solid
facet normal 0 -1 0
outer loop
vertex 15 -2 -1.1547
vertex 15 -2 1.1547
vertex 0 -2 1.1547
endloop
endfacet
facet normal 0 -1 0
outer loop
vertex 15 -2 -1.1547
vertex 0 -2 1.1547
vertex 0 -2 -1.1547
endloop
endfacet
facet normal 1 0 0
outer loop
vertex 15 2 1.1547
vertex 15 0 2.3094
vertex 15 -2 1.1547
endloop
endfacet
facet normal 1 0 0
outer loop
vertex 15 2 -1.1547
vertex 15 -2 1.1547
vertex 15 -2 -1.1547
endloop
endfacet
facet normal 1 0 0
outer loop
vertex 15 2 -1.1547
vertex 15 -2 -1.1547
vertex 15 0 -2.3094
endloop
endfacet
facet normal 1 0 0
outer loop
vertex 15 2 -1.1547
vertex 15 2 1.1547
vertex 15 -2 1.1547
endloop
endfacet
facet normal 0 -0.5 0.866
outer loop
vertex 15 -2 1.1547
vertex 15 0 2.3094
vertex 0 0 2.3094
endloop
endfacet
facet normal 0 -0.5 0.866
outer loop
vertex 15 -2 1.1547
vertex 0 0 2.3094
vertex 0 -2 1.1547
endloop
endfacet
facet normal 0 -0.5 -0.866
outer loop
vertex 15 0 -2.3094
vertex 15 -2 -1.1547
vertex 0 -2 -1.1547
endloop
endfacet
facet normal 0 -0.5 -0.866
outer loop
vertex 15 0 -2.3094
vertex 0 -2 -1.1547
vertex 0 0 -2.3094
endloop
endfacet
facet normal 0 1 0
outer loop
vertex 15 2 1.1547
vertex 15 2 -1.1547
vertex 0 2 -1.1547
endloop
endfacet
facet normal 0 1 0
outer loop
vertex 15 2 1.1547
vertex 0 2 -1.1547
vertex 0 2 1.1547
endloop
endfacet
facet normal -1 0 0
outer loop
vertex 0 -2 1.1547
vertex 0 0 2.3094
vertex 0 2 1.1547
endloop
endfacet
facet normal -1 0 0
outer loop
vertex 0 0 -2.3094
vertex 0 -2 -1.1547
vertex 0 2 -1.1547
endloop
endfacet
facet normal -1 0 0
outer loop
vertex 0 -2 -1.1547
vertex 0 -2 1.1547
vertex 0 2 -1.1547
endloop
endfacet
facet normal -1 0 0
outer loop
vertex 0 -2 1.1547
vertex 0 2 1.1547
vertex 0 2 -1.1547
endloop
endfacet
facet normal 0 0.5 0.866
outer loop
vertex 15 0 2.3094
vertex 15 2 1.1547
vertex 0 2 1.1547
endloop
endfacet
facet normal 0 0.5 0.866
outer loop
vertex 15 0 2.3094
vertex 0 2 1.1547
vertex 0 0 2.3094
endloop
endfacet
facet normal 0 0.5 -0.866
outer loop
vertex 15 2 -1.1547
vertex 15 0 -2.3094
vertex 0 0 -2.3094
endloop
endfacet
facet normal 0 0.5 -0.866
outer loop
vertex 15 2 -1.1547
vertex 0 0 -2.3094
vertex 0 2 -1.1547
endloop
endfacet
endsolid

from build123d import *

# Parameters (mm, degrees)
SKETCH1_R           = 2
BOSS_EXTRUDE1_DEPTH = 15
BOSS_EXTRUDE2_DEPTH = 15


with BuildPart() as part:
    # Sketch1 → Boss-Extrude1 (new body)
    with BuildSketch(Plane(origin=(0, 0, 0), x_dir=(0, 0, -1), z_dir=(1, 0, 0))):
        Circle(SKETCH1_R)
    extrude(amount=BOSS_EXTRUDE1_DEPTH)

    # Sketch2 → Boss-Extrude2 (add, through all)
    with BuildSketch(Plane(origin=(15, 0, 0), x_dir=(0, 0, -1), z_dir=(1, 0, 0))):
        Polygon((2.309401077, 0), (1.154700538, 2), (-1.154700538, 2), (-2.309401077, 0), (-1.154700538, -2), (1.154700538, -2), align=None)
    extrude(amount=-BOSS_EXTRUDE2_DEPTH)


solid = part.part
